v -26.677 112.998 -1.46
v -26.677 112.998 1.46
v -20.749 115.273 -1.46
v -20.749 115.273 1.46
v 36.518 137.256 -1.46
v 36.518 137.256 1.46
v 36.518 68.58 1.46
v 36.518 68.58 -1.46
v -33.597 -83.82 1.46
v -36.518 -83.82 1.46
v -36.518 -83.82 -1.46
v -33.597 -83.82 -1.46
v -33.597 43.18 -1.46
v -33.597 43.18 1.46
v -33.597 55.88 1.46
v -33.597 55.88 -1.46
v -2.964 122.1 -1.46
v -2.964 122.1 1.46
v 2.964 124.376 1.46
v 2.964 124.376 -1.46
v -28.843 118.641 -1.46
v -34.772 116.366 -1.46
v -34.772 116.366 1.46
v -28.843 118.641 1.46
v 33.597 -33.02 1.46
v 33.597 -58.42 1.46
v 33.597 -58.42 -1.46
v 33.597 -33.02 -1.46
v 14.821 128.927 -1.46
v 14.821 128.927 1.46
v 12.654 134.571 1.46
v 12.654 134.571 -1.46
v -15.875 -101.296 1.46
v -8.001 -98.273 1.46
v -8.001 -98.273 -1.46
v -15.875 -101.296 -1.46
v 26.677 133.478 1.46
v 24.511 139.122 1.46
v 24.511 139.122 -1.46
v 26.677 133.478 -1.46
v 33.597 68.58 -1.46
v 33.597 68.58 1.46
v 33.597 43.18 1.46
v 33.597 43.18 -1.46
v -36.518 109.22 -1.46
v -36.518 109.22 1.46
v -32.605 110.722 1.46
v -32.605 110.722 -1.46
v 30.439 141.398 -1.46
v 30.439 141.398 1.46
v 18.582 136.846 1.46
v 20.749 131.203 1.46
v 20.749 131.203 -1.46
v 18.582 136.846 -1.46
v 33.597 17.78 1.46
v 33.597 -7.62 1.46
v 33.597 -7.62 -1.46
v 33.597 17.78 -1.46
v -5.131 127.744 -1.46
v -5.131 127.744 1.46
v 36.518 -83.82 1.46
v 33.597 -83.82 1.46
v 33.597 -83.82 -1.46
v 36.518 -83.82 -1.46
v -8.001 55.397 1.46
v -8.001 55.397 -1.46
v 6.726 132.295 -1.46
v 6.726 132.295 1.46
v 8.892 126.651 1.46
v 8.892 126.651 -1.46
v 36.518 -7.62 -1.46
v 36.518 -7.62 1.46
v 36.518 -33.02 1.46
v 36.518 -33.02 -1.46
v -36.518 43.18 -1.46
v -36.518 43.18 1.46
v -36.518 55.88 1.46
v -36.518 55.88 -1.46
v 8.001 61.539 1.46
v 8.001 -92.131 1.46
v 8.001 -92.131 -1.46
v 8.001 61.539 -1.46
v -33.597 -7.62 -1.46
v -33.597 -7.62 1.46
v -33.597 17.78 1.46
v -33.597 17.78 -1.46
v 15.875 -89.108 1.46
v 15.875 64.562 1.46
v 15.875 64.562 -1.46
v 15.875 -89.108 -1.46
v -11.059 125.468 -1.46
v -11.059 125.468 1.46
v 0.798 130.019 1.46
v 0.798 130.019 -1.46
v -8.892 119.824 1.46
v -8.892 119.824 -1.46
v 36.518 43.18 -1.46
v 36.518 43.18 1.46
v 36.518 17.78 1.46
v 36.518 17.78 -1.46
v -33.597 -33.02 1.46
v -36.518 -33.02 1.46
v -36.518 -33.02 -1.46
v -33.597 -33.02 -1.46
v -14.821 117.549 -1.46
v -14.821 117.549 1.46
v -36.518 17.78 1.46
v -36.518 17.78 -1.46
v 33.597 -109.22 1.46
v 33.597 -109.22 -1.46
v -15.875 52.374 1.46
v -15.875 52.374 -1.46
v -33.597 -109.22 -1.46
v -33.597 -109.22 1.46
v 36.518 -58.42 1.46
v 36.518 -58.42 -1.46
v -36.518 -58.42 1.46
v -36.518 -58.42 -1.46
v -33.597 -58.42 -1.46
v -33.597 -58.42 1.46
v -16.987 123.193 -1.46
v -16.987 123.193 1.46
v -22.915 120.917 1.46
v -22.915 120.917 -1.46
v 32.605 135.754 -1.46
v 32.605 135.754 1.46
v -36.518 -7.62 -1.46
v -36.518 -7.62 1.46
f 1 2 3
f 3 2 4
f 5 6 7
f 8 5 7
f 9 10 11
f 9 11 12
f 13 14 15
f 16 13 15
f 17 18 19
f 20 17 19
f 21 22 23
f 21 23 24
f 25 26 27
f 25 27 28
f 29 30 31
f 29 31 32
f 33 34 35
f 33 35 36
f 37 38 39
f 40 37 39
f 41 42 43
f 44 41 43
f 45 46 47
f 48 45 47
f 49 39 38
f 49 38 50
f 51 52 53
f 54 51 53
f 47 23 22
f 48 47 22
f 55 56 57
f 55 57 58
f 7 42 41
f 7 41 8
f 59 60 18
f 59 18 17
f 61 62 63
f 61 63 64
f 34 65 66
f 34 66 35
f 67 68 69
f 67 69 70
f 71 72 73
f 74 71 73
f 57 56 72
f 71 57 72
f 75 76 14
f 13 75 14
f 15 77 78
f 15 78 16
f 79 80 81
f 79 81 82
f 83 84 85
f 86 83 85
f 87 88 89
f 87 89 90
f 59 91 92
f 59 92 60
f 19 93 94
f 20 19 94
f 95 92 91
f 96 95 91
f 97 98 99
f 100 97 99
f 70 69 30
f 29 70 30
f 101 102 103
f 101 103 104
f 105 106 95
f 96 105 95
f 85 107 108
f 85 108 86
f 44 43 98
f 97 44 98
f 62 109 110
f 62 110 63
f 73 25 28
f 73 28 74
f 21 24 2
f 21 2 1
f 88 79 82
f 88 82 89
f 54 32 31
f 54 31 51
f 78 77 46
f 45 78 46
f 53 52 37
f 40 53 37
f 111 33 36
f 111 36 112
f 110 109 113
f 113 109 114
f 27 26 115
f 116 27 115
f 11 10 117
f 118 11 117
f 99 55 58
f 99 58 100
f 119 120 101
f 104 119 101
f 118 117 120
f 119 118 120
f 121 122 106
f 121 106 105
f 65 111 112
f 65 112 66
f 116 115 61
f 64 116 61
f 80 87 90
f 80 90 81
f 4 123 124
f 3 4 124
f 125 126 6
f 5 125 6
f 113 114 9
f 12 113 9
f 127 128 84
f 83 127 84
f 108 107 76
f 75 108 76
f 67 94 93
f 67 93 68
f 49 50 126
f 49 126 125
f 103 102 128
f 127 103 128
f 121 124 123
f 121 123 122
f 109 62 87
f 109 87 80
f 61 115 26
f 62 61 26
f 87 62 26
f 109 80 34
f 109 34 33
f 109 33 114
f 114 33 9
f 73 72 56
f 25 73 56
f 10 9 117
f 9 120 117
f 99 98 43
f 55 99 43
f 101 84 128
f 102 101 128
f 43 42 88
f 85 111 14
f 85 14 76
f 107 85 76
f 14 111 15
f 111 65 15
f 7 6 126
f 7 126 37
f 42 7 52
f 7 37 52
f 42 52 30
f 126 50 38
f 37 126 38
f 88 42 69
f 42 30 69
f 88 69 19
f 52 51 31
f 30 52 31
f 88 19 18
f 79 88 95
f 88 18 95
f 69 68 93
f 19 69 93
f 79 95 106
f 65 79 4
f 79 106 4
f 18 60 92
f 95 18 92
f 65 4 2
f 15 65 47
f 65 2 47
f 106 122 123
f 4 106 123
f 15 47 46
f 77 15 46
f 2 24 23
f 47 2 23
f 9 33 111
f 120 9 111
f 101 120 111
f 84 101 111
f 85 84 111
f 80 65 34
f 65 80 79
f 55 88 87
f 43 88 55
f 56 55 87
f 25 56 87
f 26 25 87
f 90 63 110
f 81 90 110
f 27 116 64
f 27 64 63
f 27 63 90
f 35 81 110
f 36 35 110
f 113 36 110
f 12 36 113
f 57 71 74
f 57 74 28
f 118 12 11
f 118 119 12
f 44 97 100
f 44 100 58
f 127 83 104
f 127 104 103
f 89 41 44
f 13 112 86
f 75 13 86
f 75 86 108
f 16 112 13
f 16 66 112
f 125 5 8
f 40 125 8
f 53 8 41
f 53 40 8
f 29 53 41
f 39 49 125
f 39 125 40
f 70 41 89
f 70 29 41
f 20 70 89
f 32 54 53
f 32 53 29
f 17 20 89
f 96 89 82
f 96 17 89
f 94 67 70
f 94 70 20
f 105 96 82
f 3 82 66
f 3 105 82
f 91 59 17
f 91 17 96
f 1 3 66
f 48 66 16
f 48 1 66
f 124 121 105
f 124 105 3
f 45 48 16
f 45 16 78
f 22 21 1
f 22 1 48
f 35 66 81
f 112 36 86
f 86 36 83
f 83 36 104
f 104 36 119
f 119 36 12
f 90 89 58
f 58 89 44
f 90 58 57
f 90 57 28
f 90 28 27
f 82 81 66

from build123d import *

# Parameters (mm, degrees)
BOSS_EXTRUDE1_DEPTH = 1.4605
SKETCH2_W           = 2.921
SKETCH2_H           = 25.4
SKETCH2_H_2         = 12.7
CUT_EXTRUDE1_DEPTH  = 2.921
SKETCH3_W           = 6.35
SKETCH3_H           = 2.921
BOSS_EXTRUDE2_DEPTH = 6.0452
CUT_EXTRUDE2_DEPTH  = 147.066332108


with BuildPart() as part:
    # Sketch1 → Boss-Extrude1 (new, symmetric)
    with BuildSketch(Plane.XY):
        Polygon((-36.517931963, 109.22), (36.517931963, 137.255841429), (36.517931963, -109.22), (-36.517931963, -109.22), align=None)
    extrude(amount=BOSS_EXTRUDE1_DEPTH, both=True)

    # Sketch2 → Cut-Extrude1 (cut)
    with BuildSketch(Plane.XY.offset(1.4605)):
        with Locations((-35.057431963, -96.52)):
            Rectangle(SKETCH2_W, SKETCH2_H)
        with Locations((-35.057431963, -45.72)):
            Rectangle(SKETCH2_W, SKETCH2_H)
        with Locations((-35.057431963, 5.08)):
            Rectangle(SKETCH2_W, SKETCH2_H)
        with Locations((-35.057431963, 49.53)):
            Rectangle(SKETCH2_W, SKETCH2_H_2)
        with Locations((35.057431963, 49.53)):
            Rectangle(SKETCH2_W, SKETCH2_H_2)
        with Locations((35.057431963, 5.08)):
            Rectangle(SKETCH2_W, SKETCH2_H)
        with Locations((35.057431963, -96.52)):
            Rectangle(SKETCH2_W, SKETCH2_H)
        with Locations((35.057431963, -45.72)):
            Rectangle(SKETCH2_W, SKETCH2_H)
        with Locations((35.057431963, 62.23)):
            Rectangle(SKETCH2_W, SKETCH2_H_2)
    extrude(amount=-CUT_EXTRUDE1_DEPTH, mode=Mode.SUBTRACT)

    # Sketch3 → Boss-Extrude2 (add)
    with BuildSketch(Plane(origin=(-41.231132307, 107.410771898, 0), x_dir=(0.9335804264972012, 0.35836794954530177, 0), z_dir=(-0.35836794954530177, 0.9335804264972012, 0))):
        with Locations((75.914520953, 0)):
            Rectangle(SKETCH3_W, SKETCH3_H)
        with Locations((63.214520953, 0)):
            Rectangle(SKETCH3_W, SKETCH3_H)
        with Locations((50.514520953, 0)):
            Rectangle(SKETCH3_W, SKETCH3_H)
        with Locations((37.814520953, 0)):
            Rectangle(SKETCH3_W, SKETCH3_H)
        with Locations((25.114520953, 0)):
            Rectangle(SKETCH3_W, SKETCH3_H)
        with Locations((12.414520953, 0)):
            Rectangle(SKETCH3_W, SKETCH3_H)
    extrude(amount=BOSS_EXTRUDE2_DEPTH)

    # Sketch5 → Cut-Extrude2 (cut, through all)
    with BuildSketch(Plane.XY.offset(1.4605)):
        Polygon((-15.875, 52.374079158), (-8.001, 55.39662457), (-8.001, -98.27337543), (-15.875, -101.295920842), align=None)
        Polygon((8.001, 61.539216859), (15.875, 64.561762271), (15.875, -89.108237729), (8.001, -92.130783141), align=None)
    extrude(amount=-CUT_EXTRUDE2_DEPTH, mode=Mode.SUBTRACT)


solid = part.part
